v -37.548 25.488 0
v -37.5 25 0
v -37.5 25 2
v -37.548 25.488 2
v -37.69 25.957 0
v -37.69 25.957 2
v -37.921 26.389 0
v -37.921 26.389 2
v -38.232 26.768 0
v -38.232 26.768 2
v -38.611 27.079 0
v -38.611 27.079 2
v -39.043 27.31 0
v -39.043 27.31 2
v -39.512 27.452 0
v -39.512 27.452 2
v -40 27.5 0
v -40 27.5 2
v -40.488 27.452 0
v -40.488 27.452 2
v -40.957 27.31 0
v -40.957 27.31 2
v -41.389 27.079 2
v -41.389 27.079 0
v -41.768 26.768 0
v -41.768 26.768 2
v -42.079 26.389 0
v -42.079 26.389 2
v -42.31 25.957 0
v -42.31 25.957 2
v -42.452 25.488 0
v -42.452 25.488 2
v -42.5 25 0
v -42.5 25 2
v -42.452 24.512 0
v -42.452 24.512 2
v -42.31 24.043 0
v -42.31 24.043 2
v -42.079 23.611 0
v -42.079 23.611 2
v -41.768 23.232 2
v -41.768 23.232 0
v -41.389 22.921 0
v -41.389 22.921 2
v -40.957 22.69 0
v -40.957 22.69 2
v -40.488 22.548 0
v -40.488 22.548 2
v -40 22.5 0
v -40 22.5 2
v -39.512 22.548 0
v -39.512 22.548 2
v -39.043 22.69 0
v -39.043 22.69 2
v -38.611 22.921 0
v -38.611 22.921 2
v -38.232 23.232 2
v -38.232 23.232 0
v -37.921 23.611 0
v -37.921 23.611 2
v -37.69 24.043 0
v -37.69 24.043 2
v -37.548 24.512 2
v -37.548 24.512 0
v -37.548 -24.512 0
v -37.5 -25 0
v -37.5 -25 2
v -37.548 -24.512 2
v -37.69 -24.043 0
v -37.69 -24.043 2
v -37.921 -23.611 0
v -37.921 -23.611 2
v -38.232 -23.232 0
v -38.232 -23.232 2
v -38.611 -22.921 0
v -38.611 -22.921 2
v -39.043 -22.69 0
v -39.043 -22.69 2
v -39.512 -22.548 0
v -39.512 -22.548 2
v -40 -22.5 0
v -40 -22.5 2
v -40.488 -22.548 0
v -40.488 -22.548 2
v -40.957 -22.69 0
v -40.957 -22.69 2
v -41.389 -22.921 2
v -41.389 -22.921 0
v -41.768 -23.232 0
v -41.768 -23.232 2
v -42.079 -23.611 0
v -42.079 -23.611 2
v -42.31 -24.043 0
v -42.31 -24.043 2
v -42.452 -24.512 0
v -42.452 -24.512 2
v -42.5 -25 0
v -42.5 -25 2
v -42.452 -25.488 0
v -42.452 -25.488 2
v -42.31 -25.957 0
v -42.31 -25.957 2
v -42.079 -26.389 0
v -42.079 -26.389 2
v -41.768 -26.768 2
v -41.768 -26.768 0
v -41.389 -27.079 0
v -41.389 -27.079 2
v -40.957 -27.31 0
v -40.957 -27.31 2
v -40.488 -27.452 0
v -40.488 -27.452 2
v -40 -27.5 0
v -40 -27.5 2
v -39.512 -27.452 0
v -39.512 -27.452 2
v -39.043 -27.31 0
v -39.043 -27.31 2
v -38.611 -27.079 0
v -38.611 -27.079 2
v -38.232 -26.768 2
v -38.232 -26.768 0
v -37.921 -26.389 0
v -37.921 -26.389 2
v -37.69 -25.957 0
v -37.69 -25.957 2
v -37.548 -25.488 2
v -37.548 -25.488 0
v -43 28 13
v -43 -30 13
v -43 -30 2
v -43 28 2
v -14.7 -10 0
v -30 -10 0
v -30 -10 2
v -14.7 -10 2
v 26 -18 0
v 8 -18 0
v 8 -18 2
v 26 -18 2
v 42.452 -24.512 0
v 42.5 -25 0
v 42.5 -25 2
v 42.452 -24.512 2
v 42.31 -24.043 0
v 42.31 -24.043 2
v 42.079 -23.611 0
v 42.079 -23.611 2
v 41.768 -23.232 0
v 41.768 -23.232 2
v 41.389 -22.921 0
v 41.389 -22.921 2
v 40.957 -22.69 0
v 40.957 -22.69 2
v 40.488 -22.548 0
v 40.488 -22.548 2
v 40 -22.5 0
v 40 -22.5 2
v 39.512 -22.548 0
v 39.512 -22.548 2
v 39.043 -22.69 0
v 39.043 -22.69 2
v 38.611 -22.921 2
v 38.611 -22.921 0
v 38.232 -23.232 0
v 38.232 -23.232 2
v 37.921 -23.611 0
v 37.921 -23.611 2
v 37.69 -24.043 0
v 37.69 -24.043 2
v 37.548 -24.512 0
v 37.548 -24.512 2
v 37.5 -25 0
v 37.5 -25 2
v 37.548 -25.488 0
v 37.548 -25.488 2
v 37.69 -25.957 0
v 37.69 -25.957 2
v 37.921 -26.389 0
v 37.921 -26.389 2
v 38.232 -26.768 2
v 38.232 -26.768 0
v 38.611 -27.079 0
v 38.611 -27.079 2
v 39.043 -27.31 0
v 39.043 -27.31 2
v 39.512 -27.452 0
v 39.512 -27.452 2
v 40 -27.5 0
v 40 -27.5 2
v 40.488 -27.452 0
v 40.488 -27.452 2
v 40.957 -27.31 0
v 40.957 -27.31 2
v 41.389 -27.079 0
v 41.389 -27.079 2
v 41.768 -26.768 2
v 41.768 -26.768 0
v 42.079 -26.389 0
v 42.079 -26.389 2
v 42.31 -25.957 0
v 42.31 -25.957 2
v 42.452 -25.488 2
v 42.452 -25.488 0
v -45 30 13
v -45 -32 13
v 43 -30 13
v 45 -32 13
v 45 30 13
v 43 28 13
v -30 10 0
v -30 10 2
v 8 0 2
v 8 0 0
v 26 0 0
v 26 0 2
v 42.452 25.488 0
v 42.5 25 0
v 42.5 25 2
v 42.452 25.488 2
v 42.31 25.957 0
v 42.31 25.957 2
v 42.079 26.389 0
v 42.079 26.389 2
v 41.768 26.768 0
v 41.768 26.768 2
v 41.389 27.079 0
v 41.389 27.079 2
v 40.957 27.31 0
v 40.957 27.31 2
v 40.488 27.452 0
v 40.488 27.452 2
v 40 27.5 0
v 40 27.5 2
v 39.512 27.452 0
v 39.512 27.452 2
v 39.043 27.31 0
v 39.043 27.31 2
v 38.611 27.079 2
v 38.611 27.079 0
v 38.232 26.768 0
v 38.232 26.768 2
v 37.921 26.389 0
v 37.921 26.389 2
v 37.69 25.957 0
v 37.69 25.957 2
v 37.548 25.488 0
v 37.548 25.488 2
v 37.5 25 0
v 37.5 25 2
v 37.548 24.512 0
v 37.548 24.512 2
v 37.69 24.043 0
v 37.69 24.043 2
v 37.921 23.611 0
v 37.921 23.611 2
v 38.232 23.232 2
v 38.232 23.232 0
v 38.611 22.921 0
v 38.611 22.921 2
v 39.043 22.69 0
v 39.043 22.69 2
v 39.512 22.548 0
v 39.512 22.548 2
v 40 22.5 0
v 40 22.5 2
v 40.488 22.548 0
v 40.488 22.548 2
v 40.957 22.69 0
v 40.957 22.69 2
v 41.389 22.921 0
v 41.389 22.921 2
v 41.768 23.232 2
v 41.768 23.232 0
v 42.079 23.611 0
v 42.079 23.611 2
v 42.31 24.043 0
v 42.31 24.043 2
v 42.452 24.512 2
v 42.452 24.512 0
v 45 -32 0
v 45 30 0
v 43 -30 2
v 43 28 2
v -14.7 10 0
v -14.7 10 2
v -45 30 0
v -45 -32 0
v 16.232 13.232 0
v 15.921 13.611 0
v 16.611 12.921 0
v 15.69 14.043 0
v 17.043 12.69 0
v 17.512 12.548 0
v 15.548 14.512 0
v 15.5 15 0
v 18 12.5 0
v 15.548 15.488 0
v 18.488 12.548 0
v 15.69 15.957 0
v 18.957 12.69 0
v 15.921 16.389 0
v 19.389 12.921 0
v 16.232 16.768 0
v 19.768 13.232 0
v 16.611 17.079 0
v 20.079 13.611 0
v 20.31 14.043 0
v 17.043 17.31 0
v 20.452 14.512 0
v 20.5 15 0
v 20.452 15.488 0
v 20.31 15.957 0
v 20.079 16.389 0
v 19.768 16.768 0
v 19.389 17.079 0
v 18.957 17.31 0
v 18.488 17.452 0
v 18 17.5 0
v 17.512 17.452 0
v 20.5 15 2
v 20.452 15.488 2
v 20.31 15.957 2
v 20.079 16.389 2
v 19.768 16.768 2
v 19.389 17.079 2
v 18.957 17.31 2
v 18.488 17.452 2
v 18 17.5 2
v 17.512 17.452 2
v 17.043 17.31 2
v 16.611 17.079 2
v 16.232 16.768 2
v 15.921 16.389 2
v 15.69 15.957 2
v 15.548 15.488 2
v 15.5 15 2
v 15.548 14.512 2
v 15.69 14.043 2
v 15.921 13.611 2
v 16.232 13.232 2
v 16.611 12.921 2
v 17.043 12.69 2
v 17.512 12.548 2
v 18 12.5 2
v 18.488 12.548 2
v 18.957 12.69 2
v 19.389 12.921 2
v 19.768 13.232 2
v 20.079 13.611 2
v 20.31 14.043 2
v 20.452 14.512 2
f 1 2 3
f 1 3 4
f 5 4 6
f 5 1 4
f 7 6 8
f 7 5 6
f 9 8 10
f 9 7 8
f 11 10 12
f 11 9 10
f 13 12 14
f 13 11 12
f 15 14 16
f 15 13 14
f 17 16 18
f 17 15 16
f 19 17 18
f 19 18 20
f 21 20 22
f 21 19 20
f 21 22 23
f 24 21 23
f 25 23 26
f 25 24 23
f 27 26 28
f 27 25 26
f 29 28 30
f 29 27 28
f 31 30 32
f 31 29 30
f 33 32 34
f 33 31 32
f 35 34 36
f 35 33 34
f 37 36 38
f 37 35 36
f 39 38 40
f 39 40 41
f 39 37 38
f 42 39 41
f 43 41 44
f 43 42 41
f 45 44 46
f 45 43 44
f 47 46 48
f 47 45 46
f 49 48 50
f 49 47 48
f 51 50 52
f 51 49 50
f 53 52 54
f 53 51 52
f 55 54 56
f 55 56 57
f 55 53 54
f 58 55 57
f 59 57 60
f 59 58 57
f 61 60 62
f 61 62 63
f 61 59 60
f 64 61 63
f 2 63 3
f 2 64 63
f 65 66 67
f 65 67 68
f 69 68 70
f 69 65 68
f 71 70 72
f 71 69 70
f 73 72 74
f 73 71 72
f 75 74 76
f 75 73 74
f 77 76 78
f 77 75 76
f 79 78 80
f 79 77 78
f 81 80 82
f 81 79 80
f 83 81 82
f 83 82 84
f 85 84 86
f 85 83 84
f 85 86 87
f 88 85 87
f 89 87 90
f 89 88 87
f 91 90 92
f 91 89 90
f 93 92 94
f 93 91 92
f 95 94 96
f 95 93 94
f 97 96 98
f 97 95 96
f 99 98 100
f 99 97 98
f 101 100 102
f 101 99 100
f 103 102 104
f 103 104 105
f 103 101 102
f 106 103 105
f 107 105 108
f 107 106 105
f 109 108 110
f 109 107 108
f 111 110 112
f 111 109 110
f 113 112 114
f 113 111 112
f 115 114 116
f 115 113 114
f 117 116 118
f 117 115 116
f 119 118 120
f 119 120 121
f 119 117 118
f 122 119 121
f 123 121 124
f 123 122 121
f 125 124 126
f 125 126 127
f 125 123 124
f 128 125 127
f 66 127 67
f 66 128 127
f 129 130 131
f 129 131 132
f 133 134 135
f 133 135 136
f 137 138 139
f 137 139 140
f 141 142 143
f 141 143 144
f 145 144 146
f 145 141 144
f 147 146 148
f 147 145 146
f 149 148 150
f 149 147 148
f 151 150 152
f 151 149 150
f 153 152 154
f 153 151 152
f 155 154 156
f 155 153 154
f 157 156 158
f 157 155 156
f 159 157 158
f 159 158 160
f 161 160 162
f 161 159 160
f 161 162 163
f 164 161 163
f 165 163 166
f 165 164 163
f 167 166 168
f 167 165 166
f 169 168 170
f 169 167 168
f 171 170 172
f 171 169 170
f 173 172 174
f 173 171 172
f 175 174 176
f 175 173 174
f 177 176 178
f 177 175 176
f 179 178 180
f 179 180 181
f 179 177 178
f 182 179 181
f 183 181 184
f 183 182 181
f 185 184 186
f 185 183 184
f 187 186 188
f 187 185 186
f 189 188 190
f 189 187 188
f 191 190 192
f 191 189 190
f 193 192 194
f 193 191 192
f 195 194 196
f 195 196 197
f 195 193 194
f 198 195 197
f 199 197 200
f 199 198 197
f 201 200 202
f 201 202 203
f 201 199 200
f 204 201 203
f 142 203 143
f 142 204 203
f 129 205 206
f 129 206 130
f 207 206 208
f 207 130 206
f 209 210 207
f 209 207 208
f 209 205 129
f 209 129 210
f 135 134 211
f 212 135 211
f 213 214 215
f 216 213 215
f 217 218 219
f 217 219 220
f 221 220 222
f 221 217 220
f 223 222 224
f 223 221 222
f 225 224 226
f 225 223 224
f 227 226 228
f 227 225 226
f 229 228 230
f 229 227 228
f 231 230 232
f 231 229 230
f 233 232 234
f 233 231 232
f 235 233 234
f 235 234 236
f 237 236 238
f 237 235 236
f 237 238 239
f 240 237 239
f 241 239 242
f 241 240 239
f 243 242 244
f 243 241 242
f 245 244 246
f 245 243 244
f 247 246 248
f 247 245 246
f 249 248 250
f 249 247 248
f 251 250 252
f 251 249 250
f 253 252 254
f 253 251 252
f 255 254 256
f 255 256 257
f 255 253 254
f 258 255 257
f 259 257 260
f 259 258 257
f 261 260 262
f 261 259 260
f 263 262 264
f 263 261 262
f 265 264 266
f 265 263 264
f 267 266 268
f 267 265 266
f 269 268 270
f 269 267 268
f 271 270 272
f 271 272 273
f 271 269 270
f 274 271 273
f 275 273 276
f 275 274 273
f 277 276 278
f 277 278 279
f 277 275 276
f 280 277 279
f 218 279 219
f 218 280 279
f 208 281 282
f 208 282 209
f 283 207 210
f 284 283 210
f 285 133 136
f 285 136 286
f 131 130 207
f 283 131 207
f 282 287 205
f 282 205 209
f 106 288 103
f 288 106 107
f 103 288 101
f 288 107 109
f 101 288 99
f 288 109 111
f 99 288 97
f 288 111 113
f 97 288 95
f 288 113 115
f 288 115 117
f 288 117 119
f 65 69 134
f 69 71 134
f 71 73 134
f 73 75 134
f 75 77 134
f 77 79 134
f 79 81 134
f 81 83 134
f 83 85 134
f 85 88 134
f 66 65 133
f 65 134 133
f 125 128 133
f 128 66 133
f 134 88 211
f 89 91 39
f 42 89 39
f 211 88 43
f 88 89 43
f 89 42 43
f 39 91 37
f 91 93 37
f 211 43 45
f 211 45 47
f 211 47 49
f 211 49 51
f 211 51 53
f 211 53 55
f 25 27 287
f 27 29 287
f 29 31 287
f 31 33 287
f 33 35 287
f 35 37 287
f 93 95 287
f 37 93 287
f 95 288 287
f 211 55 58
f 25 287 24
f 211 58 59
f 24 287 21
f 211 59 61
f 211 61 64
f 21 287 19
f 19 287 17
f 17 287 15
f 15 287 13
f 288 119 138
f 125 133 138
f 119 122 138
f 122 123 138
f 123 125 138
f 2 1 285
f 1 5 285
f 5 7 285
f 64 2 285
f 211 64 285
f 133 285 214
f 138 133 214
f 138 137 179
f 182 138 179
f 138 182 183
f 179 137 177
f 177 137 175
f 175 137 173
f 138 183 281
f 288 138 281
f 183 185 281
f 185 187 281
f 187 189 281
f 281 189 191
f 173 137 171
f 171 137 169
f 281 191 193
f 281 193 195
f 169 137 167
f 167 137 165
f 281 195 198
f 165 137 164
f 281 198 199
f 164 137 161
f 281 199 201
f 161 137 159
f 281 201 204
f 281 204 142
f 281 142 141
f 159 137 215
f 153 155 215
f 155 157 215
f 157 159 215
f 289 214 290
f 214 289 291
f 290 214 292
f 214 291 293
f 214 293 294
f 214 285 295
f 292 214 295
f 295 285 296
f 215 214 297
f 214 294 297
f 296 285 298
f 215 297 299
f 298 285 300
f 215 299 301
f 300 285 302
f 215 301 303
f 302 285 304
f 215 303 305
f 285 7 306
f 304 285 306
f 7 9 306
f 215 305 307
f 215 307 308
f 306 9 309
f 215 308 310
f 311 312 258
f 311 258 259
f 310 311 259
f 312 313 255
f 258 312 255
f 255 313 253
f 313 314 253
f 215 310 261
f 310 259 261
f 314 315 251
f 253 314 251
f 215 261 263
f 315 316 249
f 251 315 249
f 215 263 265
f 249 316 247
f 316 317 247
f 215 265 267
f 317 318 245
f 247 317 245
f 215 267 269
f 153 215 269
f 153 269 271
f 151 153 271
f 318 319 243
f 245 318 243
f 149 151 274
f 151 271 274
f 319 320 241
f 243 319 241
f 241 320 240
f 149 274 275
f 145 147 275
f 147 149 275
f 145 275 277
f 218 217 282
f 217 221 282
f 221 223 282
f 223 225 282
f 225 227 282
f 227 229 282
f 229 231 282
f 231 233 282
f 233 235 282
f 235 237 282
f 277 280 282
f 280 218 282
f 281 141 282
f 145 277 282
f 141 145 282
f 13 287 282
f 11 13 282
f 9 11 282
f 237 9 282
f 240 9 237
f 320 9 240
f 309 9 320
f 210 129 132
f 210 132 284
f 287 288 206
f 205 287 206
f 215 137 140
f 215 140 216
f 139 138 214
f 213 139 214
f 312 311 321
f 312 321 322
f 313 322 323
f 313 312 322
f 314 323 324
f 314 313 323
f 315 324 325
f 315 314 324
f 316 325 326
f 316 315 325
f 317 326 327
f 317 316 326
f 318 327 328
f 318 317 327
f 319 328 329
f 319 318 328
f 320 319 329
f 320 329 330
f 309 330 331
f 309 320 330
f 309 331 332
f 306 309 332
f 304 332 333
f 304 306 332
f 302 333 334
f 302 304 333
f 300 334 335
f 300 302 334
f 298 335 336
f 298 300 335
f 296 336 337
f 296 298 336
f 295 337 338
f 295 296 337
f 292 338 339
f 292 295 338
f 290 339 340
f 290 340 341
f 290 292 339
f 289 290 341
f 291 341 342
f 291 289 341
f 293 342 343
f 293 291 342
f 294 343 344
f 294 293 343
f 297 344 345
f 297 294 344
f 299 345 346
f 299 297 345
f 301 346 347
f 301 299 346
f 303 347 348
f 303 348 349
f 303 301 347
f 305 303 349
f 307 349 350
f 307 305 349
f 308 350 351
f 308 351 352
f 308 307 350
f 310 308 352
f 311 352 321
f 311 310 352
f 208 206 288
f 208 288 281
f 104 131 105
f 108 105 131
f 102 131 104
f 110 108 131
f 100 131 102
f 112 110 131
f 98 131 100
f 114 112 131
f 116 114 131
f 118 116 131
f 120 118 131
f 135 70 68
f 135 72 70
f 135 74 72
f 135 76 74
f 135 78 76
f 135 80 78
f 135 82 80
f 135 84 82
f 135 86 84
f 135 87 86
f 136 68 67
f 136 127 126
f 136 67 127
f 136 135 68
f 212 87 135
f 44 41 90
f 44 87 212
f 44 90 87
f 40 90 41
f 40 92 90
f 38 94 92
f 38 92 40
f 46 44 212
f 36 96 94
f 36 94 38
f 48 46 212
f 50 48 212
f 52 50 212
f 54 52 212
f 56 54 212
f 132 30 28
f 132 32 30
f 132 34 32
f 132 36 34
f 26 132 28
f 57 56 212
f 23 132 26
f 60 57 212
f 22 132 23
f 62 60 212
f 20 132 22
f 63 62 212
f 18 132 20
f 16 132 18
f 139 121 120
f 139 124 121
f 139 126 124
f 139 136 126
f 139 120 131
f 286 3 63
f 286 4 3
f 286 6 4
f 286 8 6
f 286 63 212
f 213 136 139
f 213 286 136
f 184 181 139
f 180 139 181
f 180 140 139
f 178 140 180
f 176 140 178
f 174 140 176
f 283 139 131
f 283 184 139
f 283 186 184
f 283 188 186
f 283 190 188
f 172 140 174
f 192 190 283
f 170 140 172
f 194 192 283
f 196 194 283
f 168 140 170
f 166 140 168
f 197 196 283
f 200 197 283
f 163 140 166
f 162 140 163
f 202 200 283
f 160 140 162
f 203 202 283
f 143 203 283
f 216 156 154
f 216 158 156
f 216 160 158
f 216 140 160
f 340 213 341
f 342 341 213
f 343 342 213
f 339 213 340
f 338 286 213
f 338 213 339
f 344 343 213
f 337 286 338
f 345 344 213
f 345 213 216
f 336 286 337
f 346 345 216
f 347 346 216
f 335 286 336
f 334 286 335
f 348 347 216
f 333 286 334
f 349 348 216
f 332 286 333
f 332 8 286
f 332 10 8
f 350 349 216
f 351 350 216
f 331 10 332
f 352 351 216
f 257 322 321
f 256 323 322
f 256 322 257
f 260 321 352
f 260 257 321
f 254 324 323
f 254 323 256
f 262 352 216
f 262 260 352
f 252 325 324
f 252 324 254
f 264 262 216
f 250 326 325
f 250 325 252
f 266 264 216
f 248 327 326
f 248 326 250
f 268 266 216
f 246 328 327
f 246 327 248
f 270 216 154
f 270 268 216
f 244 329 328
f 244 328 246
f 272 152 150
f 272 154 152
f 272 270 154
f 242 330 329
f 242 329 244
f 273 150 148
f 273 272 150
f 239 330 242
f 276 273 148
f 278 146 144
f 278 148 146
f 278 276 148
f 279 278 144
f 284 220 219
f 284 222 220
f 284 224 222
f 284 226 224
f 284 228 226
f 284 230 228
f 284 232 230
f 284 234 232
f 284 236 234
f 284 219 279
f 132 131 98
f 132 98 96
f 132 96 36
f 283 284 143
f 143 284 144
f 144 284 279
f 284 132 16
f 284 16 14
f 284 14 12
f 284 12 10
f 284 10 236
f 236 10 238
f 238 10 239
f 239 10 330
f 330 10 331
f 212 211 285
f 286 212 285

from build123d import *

# Parameters (mm, degrees)
SKETCH003_W  = 90
SKETCH003_H  = 13
PAD003_DEPTH = 2
SKETCH002_W  = 60
SKETCH002_H  = 13
PAD002_DEPTH = 2
SKETCH_W     = 90
SKETCH_H     = 60
SKETCH_R     = 2.5
SKETCH_W_2   = 18
SKETCH_H_2   = 18
SKETCH_W_3   = 15.3
SKETCH_H_3   = 20
PAD_DEPTH    = 2
SKETCH001_W  = 90
SKETCH001_H  = 13
PAD001_DEPTH = 2
SKETCH004_W  = 60
SKETCH004_H  = 13
PAD004_DEPTH = 2


with BuildPart() as body003:
    # Sketch003 → Pad003 (new body)
    with BuildSketch(Plane.XZ):
        with Locations((0, 6.5)):
            Rectangle(SKETCH003_W, SKETCH003_H)
    extrude(amount=PAD003_DEPTH)


with BuildPart() as body003_1:
    # Body003 placement: moved
    add(body003.part.moved(Location((0, -30, 0))))


with BuildPart() as body002:
    # Sketch002 → Pad002 (new body)
    with BuildSketch(Plane.YZ):
        with Locations((0, 6.5)):
            Rectangle(SKETCH002_W, SKETCH002_H)
    extrude(amount=PAD002_DEPTH)


with BuildPart() as body002_1:
    # Body002 placement: moved
    add(body002.part.moved(Location((43, 0, 0))))


with BuildPart() as body:
    # Sketch → Pad (new body)
    with BuildSketch(Plane.XY):
        Rectangle(SKETCH_W, SKETCH_H)
        with Locations((-40, 25)):
            Circle(SKETCH_R, mode=Mode.SUBTRACT)
        with Locations((-40, -25)):
            Circle(SKETCH_R, mode=Mode.SUBTRACT)
        with Locations((40, -25)):
            Circle(SKETCH_R, mode=Mode.SUBTRACT)
        with Locations((40, 25)):
            Circle(SKETCH_R, mode=Mode.SUBTRACT)
        with Locations((18, 15)):
            Circle(SKETCH_R, mode=Mode.SUBTRACT)
        with Locations((17, -9)):
            Rectangle(SKETCH_W_2, SKETCH_H_2, mode=Mode.SUBTRACT)
        with Locations((-22.35, 0)):
            Rectangle(SKETCH_W_3, SKETCH_H_3, mode=Mode.SUBTRACT)
    extrude(amount=PAD_DEPTH)


with BuildPart() as body001:
    # Sketch001 → Pad001 (new body)
    with BuildSketch(Plane.XZ):
        with Locations((0, 6.5)):
            Rectangle(SKETCH001_W, SKETCH001_H)
    extrude(amount=PAD001_DEPTH)


with BuildPart() as body001_1:
    # Body001 placement: moved
    add(body001.part.moved(Location((0, 30, 0))))


with BuildPart() as fusion001:
    # Fusion base: copy of Body
    add(body.part)

    # Fusion: union Body001
    add(body001_1.part)

    # Fusion001: union Body002, Body, Body001
    add(body002_1.part)
    add(body.part)
    add(body001_1.part)


with BuildPart() as fusion002:
    # Fusion002 base: copy of Fusion001
    add(fusion001.part)

    # Fusion002: union Body003
    add(body003_1.part)


with BuildPart() as body004:
    # Sketch004 → Pad004 (new body)
    with BuildSketch(Plane.YZ):
        with Locations((0, 6.5)):
            Rectangle(SKETCH004_W, SKETCH004_H)
    extrude(amount=PAD004_DEPTH)


with BuildPart() as body004_1:
    # Body004 placement: moved
    add(body004.part.moved(Location((-45, 0, 0))))


with BuildPart() as fusion004:
    # Fusion003 base: copy of Fusion002
    add(fusion002.part)

    # Fusion003: union Body004
    add(body004_1.part)

    # Fusion004: union Fusion002, Body004, Fusion001, Body003
    add(fusion002.part)
    add(body004_1.part)
    add(fusion001.part)
    add(body003_1.part)


solid = fusion004.part
